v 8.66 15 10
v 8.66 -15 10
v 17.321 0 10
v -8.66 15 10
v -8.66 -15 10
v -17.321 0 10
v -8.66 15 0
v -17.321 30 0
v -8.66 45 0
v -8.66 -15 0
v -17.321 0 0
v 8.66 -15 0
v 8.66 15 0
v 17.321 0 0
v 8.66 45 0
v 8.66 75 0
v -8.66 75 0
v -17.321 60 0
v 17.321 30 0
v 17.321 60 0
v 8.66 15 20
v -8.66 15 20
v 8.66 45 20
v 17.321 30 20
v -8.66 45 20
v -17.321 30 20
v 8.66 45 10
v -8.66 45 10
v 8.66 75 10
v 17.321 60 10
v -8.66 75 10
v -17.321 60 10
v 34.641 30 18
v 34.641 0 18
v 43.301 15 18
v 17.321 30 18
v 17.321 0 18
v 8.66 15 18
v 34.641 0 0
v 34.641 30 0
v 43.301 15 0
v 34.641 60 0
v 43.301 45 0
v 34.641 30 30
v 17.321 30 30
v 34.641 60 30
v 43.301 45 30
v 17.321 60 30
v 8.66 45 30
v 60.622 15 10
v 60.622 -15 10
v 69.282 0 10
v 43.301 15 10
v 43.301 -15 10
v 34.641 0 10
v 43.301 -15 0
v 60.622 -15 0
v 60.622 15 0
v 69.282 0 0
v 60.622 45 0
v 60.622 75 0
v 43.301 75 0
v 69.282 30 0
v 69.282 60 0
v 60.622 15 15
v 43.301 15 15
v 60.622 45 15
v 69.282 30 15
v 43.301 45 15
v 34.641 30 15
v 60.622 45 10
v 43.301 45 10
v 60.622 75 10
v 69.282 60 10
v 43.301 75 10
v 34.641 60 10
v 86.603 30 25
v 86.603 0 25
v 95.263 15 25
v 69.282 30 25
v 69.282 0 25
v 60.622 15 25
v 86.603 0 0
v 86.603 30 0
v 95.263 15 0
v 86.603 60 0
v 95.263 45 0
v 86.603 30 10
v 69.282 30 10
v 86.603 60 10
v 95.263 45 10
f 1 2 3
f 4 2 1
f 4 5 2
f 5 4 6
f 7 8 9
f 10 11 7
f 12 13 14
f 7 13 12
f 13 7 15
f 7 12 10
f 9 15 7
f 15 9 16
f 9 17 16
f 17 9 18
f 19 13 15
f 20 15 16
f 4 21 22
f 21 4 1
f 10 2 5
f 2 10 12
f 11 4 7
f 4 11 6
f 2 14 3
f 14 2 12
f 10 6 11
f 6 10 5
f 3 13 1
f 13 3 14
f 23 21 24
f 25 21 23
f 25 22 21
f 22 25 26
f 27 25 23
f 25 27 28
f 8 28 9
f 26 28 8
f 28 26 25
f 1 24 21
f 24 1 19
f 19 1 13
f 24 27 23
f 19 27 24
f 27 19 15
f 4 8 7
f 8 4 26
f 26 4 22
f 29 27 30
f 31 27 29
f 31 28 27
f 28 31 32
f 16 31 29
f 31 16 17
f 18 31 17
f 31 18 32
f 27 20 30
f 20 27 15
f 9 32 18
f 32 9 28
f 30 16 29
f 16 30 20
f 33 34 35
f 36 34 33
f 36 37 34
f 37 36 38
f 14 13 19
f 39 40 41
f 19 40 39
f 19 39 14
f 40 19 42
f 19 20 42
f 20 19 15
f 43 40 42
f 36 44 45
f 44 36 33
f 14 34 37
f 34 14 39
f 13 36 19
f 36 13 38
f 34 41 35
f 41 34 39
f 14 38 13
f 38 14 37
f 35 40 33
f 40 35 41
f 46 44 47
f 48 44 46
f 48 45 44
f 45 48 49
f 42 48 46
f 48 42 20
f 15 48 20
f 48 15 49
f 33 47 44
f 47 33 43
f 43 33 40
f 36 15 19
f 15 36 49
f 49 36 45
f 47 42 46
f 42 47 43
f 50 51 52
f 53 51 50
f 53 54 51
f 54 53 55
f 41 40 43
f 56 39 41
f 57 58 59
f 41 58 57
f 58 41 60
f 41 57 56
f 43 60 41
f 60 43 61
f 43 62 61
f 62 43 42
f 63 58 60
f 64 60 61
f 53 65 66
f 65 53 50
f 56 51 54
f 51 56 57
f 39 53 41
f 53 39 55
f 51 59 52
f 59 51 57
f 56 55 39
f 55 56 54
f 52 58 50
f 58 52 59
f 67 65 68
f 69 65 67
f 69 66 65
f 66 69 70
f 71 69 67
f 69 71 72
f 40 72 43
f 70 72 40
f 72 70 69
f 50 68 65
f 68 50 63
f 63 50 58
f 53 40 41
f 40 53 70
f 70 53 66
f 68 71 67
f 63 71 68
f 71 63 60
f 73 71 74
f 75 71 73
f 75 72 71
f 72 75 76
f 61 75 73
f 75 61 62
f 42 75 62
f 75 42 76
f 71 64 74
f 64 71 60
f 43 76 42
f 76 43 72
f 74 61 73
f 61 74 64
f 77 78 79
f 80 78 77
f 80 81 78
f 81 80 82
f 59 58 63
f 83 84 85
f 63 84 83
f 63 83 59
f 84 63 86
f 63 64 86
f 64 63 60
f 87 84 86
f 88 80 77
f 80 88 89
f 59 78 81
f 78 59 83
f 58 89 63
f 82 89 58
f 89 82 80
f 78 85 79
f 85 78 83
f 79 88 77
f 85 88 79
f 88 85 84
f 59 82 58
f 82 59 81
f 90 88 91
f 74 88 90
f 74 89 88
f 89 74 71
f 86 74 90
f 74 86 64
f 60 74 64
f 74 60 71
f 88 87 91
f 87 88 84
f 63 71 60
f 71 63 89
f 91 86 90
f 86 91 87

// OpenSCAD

/*
This is a simple script to generate 3d model base for the 3d printable game (name TBD)
You can customize it and use it as far as you refer to the original.
Author: Simmons http://www.thingiverse.com/Simmons/about
more information: www.randomlandscape.com
*/

// Dimension of the single prism
a= 30; //  [30:Small, 50:Medium, 70:Large]
//h= 10; //altezza standard


// Height prism 1
h1 = 10; // [10:35]
// Height prism 2
h2 = 20;// [10:35]
// Height prism 3
h3 = 10; // [10:35]
// Height prism 4
h4 = 18; // [10:35]
// Height prism 5
h5 = 30; // [10:35]
// Height prism 6
h6 = 10; // [10:35]
// Height prism 7
h7 = 15; // [10:35]
// Height prism 8
h8 = 10; // [10:35]
// Height prism 9
h9 = 25; // [10:35]
// Height prism 10
h10 = 10; // [10:35]

l = a*tan(30); //lato dell'esagono

// esagono 1
translate([0,0,h1/2]){
esagono(h1,a);
}

// esagono 2
translate([0,a,h2/2]){
esagono(h2,a);
}

// esagono 3
translate([0,a*2,h3/2]){
esagono(h3,a);
}

//seconda colonna
translate([l/2 + l,a/2,0]){ //l/2 + l è lo spostamento per la seconda linea
// esagono 4
translate([0,0,h4/2]){
esagono(h4,a);
}
// esagono 5
translate([0,a,h5/2]){
esagono(h5,a);
}

}//fine seconda colonna

//terza colonna
translate([l*3,0,0]){ //l*3 è lo spostamento per la terza linea
// esagono 6
translate([0,0,h6/2]){
esagono(h6,a);
}

// esagono 7
translate([0,a,h7/2]){
esagono(h7,a);
}

//esagono 8
translate([0,a*2,h8/2]){
esagono(h8,a);
}

}//fine terza colonna

//quarta colonna
translate([l/2 + 4* l,a/2,0]){ //l/2 + l è lo spostamento per la seconda linea
// esagono 9
translate([0,0,h9/2]){
esagono(h9,a);
}

// esagono 10
translate([0,a,h10/2]){
esagono(h10,a);
}

}//fine quarta colonna

module esagono ( h, distanza_lati ) {

lato= distanza_lati*tan(30);

diagonale_angoli = (lato/(sin(30)));
echo("diagonale:",diagonale_angoli);

cube([lato,distanza_lati,h], center=true);
rotate(a=[0,0,60]) {
cube([lato,distanza_lati,h], center=true);
}
rotate(a=[0,0,120]) {
cube([lato,distanza_lati,h], center=true);
}
}//fine esagono
        
